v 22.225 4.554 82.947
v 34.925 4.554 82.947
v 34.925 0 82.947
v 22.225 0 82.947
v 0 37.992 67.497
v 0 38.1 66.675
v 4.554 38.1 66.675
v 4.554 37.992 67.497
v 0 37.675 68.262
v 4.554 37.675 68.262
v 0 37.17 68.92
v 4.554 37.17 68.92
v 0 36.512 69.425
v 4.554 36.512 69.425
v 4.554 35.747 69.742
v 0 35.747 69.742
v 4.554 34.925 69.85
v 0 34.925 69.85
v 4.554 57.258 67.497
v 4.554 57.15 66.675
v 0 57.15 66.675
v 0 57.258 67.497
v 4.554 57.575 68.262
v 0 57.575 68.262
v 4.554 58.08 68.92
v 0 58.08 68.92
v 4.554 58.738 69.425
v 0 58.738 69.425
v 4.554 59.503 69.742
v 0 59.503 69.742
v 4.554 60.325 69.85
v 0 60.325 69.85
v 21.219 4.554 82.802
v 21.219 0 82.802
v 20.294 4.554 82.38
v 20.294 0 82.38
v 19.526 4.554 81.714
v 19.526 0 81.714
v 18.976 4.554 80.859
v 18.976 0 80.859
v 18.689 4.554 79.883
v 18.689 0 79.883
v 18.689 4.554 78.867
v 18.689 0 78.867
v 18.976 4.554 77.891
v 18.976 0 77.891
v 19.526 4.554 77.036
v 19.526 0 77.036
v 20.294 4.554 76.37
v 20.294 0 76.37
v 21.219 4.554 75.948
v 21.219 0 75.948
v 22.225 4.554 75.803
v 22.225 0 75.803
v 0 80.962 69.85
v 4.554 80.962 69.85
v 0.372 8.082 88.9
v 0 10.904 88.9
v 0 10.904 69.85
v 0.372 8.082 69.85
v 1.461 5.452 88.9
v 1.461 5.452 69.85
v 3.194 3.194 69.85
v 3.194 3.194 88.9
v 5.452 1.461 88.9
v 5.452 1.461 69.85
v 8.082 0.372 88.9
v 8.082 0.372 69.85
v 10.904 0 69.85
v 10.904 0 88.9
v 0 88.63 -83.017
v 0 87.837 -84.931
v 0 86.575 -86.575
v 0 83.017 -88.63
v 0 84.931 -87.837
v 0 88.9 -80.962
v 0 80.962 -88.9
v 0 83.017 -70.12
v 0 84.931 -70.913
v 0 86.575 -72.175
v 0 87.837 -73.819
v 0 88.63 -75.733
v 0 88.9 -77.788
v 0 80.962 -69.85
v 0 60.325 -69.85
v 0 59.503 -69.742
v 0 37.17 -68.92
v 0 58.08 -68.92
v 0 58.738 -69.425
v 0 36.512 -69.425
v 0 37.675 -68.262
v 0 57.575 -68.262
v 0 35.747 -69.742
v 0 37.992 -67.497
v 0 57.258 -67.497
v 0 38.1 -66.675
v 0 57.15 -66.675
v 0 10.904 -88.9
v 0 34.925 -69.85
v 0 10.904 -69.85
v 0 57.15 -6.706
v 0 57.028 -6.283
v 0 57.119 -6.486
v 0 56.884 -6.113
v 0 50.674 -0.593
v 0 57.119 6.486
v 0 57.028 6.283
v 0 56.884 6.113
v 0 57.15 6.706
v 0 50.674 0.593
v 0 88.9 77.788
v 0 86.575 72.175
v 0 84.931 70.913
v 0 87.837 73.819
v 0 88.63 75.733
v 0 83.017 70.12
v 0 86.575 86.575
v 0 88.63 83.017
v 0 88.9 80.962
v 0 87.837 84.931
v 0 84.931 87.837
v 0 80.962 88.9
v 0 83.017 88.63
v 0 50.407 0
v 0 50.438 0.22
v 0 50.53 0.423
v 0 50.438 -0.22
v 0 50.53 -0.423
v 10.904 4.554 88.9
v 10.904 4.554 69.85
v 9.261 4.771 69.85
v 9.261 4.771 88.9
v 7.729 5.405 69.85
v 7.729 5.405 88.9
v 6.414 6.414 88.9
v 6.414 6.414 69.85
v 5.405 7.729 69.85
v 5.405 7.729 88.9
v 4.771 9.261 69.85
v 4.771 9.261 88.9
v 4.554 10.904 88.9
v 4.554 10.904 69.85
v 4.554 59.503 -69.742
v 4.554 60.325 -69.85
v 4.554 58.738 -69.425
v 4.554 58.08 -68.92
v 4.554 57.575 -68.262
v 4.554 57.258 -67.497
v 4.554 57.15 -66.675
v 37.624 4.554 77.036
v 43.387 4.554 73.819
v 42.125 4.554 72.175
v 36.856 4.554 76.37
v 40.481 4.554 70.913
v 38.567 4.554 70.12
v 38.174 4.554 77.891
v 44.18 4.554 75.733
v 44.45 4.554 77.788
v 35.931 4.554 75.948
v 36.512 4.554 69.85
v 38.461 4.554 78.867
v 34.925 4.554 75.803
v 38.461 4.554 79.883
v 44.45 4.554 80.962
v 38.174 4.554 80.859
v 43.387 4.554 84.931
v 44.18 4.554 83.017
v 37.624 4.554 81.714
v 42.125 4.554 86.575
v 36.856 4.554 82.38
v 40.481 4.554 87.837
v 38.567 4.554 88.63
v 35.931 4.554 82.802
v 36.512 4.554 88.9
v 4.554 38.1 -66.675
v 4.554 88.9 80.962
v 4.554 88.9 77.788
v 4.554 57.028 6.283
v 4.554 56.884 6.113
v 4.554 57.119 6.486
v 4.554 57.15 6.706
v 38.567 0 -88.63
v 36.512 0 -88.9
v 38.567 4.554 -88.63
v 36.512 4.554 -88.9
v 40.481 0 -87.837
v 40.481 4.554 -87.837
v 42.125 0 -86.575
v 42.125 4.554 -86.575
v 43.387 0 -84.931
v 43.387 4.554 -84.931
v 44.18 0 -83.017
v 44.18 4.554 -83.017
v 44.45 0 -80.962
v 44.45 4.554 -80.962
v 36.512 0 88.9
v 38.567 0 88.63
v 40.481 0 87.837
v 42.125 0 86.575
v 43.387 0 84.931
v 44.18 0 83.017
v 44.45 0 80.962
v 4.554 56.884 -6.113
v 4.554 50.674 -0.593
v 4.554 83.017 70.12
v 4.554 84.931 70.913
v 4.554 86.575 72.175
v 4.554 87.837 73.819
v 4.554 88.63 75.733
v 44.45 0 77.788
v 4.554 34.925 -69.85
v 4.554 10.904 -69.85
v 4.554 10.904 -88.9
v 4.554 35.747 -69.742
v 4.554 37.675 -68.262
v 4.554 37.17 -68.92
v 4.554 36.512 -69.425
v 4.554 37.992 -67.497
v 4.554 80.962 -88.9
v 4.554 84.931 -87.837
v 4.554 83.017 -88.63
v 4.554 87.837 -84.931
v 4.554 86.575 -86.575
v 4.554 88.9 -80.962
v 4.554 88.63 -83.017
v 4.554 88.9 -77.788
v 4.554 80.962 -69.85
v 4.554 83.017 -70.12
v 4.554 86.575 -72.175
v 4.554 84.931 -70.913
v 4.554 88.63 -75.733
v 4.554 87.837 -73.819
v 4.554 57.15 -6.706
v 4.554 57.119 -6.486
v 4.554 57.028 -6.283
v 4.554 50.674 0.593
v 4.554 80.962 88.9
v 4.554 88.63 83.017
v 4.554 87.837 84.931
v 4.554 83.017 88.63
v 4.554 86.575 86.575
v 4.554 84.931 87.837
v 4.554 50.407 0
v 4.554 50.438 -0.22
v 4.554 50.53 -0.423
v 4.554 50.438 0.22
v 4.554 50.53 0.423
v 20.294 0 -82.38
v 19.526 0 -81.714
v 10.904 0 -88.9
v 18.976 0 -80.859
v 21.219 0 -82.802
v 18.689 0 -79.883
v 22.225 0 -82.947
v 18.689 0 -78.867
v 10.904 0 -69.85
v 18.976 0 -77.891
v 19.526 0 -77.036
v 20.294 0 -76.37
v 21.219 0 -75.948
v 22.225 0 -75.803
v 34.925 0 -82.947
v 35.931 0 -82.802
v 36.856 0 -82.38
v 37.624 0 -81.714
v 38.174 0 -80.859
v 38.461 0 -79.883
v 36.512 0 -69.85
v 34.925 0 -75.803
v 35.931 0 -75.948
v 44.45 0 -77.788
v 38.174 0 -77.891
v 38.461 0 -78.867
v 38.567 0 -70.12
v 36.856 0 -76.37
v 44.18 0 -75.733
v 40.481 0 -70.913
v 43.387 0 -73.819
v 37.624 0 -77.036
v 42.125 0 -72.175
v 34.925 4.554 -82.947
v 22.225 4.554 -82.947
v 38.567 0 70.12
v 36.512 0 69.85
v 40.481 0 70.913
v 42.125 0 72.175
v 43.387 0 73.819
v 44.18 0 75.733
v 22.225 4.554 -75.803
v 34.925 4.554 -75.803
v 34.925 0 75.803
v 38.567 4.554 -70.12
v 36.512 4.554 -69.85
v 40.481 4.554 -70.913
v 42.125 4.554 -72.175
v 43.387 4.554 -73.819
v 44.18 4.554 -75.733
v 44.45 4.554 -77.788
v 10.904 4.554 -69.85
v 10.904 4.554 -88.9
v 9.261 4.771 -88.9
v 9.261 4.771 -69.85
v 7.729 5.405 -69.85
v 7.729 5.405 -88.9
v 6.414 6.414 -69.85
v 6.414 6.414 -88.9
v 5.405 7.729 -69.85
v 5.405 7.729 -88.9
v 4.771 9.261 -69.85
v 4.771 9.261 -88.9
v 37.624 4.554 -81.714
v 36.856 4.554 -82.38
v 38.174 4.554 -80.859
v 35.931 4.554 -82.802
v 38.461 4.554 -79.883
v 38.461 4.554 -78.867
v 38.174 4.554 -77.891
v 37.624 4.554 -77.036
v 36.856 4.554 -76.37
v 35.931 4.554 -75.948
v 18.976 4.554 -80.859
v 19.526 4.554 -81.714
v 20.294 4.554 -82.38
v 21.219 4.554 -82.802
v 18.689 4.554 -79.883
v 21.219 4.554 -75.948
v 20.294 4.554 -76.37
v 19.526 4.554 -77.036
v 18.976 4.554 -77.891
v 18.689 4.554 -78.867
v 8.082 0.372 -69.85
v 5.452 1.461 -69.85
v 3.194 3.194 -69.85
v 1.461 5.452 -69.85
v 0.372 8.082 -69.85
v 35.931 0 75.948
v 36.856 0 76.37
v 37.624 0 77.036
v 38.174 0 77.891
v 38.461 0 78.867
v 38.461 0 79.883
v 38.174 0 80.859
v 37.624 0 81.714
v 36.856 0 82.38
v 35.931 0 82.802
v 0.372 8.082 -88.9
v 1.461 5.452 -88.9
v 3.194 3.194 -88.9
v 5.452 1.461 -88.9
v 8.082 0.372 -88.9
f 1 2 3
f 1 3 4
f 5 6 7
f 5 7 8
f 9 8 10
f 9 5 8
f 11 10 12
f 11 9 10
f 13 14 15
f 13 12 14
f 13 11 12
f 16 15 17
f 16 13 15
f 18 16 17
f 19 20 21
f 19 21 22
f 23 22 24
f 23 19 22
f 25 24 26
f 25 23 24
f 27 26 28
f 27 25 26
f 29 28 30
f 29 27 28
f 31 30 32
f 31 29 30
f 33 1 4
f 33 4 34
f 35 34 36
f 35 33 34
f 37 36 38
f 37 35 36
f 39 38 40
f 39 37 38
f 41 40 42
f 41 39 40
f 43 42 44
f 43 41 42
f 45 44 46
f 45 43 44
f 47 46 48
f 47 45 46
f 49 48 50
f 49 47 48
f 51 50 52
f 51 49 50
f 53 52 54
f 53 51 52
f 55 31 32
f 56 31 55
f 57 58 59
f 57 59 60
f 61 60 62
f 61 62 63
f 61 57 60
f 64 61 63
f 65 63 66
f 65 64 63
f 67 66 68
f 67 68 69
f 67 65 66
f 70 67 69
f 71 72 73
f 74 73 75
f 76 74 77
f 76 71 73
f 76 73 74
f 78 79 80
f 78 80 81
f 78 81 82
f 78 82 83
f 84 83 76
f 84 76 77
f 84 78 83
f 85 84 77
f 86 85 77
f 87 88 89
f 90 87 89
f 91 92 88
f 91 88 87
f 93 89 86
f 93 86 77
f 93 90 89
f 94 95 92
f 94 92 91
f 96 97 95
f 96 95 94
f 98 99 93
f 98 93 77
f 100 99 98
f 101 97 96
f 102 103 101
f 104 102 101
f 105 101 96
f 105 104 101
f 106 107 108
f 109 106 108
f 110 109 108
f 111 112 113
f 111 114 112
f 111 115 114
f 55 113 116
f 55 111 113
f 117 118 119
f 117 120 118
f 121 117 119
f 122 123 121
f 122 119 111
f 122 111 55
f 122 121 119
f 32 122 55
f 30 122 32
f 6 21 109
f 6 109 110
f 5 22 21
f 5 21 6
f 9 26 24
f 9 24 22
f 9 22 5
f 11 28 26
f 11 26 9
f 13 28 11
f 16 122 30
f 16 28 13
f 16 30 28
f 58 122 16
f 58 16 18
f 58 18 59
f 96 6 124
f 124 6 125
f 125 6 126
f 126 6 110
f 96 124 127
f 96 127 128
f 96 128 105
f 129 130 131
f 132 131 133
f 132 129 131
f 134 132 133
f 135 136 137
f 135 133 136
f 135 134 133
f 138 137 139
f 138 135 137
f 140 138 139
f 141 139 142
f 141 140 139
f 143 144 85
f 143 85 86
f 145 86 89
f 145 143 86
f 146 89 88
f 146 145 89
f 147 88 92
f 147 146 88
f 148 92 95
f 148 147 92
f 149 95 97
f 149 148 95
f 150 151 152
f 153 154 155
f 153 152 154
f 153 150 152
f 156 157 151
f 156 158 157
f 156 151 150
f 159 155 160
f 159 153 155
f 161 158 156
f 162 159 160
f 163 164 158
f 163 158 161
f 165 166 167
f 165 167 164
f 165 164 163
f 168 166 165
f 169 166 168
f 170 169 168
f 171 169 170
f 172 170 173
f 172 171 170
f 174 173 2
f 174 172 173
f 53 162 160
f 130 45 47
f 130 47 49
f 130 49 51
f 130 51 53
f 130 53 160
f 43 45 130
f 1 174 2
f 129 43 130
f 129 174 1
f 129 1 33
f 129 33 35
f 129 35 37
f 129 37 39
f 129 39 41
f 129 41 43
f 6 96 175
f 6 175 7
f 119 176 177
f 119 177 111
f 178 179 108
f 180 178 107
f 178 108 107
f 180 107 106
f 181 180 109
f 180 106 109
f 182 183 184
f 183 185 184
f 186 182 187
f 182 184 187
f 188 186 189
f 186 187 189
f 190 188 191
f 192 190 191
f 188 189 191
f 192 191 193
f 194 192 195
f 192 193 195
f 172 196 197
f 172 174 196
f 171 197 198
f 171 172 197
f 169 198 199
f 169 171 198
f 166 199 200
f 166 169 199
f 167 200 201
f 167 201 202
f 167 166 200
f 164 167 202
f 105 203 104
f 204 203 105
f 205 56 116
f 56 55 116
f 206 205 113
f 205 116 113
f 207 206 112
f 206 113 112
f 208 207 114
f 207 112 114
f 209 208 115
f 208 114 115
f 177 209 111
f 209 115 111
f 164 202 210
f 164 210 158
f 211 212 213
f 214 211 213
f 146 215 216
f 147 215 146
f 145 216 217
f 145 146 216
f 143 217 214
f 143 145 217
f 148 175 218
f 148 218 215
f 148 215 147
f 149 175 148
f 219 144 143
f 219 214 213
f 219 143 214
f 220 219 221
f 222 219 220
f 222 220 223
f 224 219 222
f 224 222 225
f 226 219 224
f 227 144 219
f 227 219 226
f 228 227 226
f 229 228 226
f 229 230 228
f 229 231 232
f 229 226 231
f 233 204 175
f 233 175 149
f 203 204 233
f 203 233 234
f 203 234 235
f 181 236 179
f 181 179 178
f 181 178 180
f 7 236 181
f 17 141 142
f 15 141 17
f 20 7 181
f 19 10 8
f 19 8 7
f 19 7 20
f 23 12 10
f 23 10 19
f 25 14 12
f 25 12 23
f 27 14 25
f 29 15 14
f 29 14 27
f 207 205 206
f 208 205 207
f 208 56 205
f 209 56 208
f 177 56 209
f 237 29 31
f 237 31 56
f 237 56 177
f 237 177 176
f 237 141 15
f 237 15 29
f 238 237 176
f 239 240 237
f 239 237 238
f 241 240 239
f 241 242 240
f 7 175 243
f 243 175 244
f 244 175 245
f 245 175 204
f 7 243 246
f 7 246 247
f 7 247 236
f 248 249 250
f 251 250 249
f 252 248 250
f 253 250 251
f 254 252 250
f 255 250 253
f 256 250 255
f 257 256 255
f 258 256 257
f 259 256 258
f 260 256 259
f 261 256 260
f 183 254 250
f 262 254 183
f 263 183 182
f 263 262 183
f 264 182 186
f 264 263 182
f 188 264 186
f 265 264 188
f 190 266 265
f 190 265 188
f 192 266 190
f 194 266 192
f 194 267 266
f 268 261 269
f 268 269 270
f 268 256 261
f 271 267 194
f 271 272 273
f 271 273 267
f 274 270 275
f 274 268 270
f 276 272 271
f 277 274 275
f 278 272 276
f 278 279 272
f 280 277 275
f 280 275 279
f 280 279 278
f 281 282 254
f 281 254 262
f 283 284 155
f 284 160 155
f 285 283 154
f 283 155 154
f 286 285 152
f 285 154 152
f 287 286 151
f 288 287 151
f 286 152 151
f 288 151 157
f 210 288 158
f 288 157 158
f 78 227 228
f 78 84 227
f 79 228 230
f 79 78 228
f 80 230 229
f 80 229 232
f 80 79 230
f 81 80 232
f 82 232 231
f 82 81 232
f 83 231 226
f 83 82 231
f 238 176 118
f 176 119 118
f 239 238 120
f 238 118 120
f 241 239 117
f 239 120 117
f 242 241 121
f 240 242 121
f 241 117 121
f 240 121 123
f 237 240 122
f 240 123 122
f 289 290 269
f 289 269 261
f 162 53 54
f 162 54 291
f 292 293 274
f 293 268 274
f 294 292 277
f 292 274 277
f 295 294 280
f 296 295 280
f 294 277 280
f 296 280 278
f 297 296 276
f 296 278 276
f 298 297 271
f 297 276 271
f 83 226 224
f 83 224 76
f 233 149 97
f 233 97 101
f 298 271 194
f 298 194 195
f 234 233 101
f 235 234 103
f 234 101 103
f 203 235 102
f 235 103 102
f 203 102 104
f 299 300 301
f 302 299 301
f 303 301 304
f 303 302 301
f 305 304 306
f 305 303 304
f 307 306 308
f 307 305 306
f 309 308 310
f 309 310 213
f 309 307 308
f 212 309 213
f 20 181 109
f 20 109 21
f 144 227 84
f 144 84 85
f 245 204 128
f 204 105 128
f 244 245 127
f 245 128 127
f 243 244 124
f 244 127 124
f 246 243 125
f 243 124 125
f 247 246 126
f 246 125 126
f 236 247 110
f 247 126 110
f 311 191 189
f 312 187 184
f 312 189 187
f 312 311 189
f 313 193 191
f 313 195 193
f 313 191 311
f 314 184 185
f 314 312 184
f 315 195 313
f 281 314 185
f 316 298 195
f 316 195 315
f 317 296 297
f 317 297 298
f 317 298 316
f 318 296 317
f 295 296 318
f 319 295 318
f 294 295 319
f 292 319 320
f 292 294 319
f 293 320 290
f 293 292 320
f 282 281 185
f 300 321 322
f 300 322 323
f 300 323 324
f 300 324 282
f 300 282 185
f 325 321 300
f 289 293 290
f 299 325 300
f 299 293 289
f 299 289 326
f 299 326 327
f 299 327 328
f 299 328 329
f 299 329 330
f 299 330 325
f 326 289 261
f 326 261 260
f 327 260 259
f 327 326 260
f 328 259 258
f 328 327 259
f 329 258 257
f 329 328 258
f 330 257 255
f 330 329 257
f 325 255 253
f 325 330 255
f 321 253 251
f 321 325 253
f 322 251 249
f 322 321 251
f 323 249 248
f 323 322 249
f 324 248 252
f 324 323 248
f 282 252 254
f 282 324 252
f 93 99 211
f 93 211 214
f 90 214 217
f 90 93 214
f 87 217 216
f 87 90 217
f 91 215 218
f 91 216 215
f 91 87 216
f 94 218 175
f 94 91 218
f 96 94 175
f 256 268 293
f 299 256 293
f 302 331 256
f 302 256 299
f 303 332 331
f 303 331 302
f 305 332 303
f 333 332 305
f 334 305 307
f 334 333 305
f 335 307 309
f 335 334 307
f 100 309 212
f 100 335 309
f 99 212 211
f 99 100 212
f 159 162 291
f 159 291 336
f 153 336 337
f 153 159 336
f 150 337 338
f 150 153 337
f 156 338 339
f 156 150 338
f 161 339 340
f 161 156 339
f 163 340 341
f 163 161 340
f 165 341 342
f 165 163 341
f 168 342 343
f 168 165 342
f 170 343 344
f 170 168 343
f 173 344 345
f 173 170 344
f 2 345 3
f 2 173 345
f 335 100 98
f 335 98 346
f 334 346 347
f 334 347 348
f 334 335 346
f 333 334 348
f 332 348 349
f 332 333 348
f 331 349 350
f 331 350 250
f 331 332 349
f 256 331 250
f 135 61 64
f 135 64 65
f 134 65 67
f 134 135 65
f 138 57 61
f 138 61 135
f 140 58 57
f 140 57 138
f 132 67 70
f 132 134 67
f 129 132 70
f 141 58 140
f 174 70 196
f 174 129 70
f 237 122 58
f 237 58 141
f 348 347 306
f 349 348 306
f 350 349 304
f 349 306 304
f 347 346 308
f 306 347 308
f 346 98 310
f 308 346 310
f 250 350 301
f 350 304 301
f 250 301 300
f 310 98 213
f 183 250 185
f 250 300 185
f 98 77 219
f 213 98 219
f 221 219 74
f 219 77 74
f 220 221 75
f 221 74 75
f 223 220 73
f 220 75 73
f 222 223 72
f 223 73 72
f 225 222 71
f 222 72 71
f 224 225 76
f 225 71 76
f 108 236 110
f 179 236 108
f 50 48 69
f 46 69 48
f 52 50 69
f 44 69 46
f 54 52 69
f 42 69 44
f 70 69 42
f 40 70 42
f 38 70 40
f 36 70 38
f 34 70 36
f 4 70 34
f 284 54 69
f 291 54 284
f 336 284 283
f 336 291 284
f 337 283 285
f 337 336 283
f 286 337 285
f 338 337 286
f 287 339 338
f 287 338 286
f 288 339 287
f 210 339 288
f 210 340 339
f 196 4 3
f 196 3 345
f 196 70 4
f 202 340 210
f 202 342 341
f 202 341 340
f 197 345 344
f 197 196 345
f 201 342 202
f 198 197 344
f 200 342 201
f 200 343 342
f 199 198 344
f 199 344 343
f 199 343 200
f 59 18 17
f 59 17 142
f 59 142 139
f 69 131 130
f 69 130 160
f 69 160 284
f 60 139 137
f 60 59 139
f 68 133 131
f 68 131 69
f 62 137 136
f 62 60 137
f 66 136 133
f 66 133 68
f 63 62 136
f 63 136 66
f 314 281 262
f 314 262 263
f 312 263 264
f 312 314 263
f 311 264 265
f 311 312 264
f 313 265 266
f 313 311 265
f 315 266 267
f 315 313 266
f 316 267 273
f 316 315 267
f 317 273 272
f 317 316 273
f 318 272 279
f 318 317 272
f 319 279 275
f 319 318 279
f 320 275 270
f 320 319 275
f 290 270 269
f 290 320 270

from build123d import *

# Parameters (mm, degrees)
BASE_FLANGE1_DEPTH = 88.9
EXTRUDE2_REACH     = 132.358
EXTRUDE3_REACH     = 133.902
EXTRUDE4_DEPTH     = 134.35
FILLET1_R          = 7.9375
CUT_EXTRUDE1_REACH = 133.902
FILLET2_R          = 0.79375


# Sheet-metal steps are written as plain solids
with BuildPart() as part:
    # Sketch1 → Base-Flange1 (new, symmetric)
    with BuildSketch(Plane.XY):
        with BuildLine():
            Line((0, 88.9), (0, 10.90422))
            ThreePointArc((0, 10.90422), (3.193772094, 3.193772094), (10.90422, 0))
            Line((10.90422, 0), (44.45, 0))
            Line((44.45, 0), (44.45, 4.55422))
            Line((44.45, 4.55422), (10.90422, 4.55422))
            ThreePointArc((10.90422, 4.55422), (6.414091939, 6.414091939), (4.55422, 10.90422))
            Line((4.55422, 10.90422), (4.55422, 88.9))
            Line((4.55422, 88.9), (0, 88.9))
        make_face()
    extrude(amount=BASE_FLANGE1_DEPTH, both=True)

    # Sketch3 → Extrude2 (cut, up to next)
    with BuildSketch(Plane(origin=(0, 4.55422, 0), x_dir=(1, 0, 0), z_dir=(0, 1, 0)), mode=Mode.PRIVATE) as extrude2_sk1:
        with BuildLine():
            Line((34.925, -82.946875), (22.225, -82.946875))
            ThreePointArc((22.225, -82.946875), (18.653125, -79.375), (22.225, -75.803125))
            Line((22.225, -75.803125), (34.925, -75.803125))
            ThreePointArc((34.925, -75.803125), (38.496875, -79.375), (34.925, -82.946875))
        make_face()
    extrude2_tool1 = extrude(extrude2_sk1.sketch, amount=-EXTRUDE2_REACH, mode=Mode.PRIVATE) & part.part
    # Sketch3 → Extrude2 (cut, up to next)
    with BuildSketch(Plane(origin=(0, 4.55422, 0), x_dir=(1, 0, 0), z_dir=(0, 1, 0)), mode=Mode.PRIVATE) as extrude2_sk2:
        with BuildLine():
            Line((34.925, 75.803125), (22.225, 75.803125))
            ThreePointArc((22.225, 75.803125), (18.653125, 79.375), (22.225, 82.946875))
            Line((22.225, 82.946875), (34.925, 82.946875))
            ThreePointArc((34.925, 82.946875), (38.496875, 79.375), (34.925, 75.803125))
        make_face()
    extrude2_tool2 = extrude(extrude2_sk2.sketch, amount=-EXTRUDE2_REACH, mode=Mode.PRIVATE) & part.part
    add(extrude2_tool1.solids().sort_by_distance((28.575, 4.55422, 79.375))[0], mode=Mode.SUBTRACT)
    add(extrude2_tool2.solids().sort_by_distance((28.575, 4.55422, -79.375))[0], mode=Mode.SUBTRACT)

    # Sketch4 → Extrude3 (cut, up to next)
    with BuildSketch(Plane(origin=(4.55422, 0, 0), x_dir=(0, 0, -1), z_dir=(1, 0, 0)), mode=Mode.PRIVATE) as extrude3_sk1:
        with BuildLine():
            Line((-69.85, 88.9), (69.85, 88.9))
            Line((69.85, 88.9), (69.85, 60.325))
            ThreePointArc((69.85, 60.325), (68.92006403, 58.07993597), (66.675, 57.15))
            Line((66.675, 57.15), (-66.675, 57.15))
            ThreePointArc((-66.675, 57.15), (-68.92006403, 58.07993597), (-69.85, 60.325))
            Line((-69.85, 60.325), (-69.85, 88.9))
        make_face()
    extrude3_tool1 = extrude(extrude3_sk1.sketch, amount=-EXTRUDE3_REACH, mode=Mode.PRIVATE) & part.part
    add(extrude3_tool1.solids().sort_by_distance((4.55422, 73.039808, 0))[0], mode=Mode.SUBTRACT)

    # Sketch5 → Extrude4 (cut, through all)
    with BuildSketch(Plane.ZY):
        with BuildLine():
            Line((-66.675, 38.1), (66.675, 38.1))
            ThreePointArc((66.675, 38.1), (68.92006403, 37.17006403), (69.85, 34.925))
            Line((69.85, 34.925), (69.85, 0))
            Line((69.85, 0), (-69.85, 0))
            Line((-69.85, 0), (-69.85, 34.925))
            ThreePointArc((-69.85, 34.925), (-68.92006403, 37.17006403), (-66.675, 38.1))
        make_face()
    extrude(amount=-EXTRUDE4_DEPTH, mode=Mode.SUBTRACT)

    # Fillet1
    fillet1_edges = [part.edges().sort_by_distance(p)[0] for p in [
        (2.27711, 88.9, 88.9),
        (2.27711, 88.9, 69.85),
        (2.27711, 88.9, -69.85),
        (44.45, 2.27711, 88.9),
        (2.27711, 88.9, -88.9),
        (44.45, 2.27711, -88.9),
        (44.45, 2.27711, 69.85),
        (44.45, 2.27711, -69.85),
    ]]
    fillet(fillet1_edges, radius=FILLET1_R)

    # Sketch6 → Cut-Extrude1 (cut, up to next)
    with BuildSketch(Plane(origin=(4.55422, 0, 0), x_dir=(0, 0, -1), z_dir=(1, 0, 0)), mode=Mode.PRIVATE) as cut_extrude1_sk1:
        Polygon((-6.35, 57.15), (6.35, 57.15), (0, 50.00625), align=None)
    cut_extrude1_tool1 = extrude(cut_extrude1_sk1.sketch, amount=-CUT_EXTRUDE1_REACH, mode=Mode.PRIVATE) & part.part
    add(cut_extrude1_tool1.solids().sort_by_distance((4.55422, 54.76875, 0))[0], mode=Mode.SUBTRACT)

    # Fillet2
    fillet2_edges = [part.edges().sort_by_distance(p)[0] for p in [
        (2.27711, 50.00625, 0),
        (2.27711, 57.15, 6.35),
        (2.27711, 57.15, -6.35),
    ]]
    fillet(fillet2_edges, radius=FILLET2_R)


solid = part.part
